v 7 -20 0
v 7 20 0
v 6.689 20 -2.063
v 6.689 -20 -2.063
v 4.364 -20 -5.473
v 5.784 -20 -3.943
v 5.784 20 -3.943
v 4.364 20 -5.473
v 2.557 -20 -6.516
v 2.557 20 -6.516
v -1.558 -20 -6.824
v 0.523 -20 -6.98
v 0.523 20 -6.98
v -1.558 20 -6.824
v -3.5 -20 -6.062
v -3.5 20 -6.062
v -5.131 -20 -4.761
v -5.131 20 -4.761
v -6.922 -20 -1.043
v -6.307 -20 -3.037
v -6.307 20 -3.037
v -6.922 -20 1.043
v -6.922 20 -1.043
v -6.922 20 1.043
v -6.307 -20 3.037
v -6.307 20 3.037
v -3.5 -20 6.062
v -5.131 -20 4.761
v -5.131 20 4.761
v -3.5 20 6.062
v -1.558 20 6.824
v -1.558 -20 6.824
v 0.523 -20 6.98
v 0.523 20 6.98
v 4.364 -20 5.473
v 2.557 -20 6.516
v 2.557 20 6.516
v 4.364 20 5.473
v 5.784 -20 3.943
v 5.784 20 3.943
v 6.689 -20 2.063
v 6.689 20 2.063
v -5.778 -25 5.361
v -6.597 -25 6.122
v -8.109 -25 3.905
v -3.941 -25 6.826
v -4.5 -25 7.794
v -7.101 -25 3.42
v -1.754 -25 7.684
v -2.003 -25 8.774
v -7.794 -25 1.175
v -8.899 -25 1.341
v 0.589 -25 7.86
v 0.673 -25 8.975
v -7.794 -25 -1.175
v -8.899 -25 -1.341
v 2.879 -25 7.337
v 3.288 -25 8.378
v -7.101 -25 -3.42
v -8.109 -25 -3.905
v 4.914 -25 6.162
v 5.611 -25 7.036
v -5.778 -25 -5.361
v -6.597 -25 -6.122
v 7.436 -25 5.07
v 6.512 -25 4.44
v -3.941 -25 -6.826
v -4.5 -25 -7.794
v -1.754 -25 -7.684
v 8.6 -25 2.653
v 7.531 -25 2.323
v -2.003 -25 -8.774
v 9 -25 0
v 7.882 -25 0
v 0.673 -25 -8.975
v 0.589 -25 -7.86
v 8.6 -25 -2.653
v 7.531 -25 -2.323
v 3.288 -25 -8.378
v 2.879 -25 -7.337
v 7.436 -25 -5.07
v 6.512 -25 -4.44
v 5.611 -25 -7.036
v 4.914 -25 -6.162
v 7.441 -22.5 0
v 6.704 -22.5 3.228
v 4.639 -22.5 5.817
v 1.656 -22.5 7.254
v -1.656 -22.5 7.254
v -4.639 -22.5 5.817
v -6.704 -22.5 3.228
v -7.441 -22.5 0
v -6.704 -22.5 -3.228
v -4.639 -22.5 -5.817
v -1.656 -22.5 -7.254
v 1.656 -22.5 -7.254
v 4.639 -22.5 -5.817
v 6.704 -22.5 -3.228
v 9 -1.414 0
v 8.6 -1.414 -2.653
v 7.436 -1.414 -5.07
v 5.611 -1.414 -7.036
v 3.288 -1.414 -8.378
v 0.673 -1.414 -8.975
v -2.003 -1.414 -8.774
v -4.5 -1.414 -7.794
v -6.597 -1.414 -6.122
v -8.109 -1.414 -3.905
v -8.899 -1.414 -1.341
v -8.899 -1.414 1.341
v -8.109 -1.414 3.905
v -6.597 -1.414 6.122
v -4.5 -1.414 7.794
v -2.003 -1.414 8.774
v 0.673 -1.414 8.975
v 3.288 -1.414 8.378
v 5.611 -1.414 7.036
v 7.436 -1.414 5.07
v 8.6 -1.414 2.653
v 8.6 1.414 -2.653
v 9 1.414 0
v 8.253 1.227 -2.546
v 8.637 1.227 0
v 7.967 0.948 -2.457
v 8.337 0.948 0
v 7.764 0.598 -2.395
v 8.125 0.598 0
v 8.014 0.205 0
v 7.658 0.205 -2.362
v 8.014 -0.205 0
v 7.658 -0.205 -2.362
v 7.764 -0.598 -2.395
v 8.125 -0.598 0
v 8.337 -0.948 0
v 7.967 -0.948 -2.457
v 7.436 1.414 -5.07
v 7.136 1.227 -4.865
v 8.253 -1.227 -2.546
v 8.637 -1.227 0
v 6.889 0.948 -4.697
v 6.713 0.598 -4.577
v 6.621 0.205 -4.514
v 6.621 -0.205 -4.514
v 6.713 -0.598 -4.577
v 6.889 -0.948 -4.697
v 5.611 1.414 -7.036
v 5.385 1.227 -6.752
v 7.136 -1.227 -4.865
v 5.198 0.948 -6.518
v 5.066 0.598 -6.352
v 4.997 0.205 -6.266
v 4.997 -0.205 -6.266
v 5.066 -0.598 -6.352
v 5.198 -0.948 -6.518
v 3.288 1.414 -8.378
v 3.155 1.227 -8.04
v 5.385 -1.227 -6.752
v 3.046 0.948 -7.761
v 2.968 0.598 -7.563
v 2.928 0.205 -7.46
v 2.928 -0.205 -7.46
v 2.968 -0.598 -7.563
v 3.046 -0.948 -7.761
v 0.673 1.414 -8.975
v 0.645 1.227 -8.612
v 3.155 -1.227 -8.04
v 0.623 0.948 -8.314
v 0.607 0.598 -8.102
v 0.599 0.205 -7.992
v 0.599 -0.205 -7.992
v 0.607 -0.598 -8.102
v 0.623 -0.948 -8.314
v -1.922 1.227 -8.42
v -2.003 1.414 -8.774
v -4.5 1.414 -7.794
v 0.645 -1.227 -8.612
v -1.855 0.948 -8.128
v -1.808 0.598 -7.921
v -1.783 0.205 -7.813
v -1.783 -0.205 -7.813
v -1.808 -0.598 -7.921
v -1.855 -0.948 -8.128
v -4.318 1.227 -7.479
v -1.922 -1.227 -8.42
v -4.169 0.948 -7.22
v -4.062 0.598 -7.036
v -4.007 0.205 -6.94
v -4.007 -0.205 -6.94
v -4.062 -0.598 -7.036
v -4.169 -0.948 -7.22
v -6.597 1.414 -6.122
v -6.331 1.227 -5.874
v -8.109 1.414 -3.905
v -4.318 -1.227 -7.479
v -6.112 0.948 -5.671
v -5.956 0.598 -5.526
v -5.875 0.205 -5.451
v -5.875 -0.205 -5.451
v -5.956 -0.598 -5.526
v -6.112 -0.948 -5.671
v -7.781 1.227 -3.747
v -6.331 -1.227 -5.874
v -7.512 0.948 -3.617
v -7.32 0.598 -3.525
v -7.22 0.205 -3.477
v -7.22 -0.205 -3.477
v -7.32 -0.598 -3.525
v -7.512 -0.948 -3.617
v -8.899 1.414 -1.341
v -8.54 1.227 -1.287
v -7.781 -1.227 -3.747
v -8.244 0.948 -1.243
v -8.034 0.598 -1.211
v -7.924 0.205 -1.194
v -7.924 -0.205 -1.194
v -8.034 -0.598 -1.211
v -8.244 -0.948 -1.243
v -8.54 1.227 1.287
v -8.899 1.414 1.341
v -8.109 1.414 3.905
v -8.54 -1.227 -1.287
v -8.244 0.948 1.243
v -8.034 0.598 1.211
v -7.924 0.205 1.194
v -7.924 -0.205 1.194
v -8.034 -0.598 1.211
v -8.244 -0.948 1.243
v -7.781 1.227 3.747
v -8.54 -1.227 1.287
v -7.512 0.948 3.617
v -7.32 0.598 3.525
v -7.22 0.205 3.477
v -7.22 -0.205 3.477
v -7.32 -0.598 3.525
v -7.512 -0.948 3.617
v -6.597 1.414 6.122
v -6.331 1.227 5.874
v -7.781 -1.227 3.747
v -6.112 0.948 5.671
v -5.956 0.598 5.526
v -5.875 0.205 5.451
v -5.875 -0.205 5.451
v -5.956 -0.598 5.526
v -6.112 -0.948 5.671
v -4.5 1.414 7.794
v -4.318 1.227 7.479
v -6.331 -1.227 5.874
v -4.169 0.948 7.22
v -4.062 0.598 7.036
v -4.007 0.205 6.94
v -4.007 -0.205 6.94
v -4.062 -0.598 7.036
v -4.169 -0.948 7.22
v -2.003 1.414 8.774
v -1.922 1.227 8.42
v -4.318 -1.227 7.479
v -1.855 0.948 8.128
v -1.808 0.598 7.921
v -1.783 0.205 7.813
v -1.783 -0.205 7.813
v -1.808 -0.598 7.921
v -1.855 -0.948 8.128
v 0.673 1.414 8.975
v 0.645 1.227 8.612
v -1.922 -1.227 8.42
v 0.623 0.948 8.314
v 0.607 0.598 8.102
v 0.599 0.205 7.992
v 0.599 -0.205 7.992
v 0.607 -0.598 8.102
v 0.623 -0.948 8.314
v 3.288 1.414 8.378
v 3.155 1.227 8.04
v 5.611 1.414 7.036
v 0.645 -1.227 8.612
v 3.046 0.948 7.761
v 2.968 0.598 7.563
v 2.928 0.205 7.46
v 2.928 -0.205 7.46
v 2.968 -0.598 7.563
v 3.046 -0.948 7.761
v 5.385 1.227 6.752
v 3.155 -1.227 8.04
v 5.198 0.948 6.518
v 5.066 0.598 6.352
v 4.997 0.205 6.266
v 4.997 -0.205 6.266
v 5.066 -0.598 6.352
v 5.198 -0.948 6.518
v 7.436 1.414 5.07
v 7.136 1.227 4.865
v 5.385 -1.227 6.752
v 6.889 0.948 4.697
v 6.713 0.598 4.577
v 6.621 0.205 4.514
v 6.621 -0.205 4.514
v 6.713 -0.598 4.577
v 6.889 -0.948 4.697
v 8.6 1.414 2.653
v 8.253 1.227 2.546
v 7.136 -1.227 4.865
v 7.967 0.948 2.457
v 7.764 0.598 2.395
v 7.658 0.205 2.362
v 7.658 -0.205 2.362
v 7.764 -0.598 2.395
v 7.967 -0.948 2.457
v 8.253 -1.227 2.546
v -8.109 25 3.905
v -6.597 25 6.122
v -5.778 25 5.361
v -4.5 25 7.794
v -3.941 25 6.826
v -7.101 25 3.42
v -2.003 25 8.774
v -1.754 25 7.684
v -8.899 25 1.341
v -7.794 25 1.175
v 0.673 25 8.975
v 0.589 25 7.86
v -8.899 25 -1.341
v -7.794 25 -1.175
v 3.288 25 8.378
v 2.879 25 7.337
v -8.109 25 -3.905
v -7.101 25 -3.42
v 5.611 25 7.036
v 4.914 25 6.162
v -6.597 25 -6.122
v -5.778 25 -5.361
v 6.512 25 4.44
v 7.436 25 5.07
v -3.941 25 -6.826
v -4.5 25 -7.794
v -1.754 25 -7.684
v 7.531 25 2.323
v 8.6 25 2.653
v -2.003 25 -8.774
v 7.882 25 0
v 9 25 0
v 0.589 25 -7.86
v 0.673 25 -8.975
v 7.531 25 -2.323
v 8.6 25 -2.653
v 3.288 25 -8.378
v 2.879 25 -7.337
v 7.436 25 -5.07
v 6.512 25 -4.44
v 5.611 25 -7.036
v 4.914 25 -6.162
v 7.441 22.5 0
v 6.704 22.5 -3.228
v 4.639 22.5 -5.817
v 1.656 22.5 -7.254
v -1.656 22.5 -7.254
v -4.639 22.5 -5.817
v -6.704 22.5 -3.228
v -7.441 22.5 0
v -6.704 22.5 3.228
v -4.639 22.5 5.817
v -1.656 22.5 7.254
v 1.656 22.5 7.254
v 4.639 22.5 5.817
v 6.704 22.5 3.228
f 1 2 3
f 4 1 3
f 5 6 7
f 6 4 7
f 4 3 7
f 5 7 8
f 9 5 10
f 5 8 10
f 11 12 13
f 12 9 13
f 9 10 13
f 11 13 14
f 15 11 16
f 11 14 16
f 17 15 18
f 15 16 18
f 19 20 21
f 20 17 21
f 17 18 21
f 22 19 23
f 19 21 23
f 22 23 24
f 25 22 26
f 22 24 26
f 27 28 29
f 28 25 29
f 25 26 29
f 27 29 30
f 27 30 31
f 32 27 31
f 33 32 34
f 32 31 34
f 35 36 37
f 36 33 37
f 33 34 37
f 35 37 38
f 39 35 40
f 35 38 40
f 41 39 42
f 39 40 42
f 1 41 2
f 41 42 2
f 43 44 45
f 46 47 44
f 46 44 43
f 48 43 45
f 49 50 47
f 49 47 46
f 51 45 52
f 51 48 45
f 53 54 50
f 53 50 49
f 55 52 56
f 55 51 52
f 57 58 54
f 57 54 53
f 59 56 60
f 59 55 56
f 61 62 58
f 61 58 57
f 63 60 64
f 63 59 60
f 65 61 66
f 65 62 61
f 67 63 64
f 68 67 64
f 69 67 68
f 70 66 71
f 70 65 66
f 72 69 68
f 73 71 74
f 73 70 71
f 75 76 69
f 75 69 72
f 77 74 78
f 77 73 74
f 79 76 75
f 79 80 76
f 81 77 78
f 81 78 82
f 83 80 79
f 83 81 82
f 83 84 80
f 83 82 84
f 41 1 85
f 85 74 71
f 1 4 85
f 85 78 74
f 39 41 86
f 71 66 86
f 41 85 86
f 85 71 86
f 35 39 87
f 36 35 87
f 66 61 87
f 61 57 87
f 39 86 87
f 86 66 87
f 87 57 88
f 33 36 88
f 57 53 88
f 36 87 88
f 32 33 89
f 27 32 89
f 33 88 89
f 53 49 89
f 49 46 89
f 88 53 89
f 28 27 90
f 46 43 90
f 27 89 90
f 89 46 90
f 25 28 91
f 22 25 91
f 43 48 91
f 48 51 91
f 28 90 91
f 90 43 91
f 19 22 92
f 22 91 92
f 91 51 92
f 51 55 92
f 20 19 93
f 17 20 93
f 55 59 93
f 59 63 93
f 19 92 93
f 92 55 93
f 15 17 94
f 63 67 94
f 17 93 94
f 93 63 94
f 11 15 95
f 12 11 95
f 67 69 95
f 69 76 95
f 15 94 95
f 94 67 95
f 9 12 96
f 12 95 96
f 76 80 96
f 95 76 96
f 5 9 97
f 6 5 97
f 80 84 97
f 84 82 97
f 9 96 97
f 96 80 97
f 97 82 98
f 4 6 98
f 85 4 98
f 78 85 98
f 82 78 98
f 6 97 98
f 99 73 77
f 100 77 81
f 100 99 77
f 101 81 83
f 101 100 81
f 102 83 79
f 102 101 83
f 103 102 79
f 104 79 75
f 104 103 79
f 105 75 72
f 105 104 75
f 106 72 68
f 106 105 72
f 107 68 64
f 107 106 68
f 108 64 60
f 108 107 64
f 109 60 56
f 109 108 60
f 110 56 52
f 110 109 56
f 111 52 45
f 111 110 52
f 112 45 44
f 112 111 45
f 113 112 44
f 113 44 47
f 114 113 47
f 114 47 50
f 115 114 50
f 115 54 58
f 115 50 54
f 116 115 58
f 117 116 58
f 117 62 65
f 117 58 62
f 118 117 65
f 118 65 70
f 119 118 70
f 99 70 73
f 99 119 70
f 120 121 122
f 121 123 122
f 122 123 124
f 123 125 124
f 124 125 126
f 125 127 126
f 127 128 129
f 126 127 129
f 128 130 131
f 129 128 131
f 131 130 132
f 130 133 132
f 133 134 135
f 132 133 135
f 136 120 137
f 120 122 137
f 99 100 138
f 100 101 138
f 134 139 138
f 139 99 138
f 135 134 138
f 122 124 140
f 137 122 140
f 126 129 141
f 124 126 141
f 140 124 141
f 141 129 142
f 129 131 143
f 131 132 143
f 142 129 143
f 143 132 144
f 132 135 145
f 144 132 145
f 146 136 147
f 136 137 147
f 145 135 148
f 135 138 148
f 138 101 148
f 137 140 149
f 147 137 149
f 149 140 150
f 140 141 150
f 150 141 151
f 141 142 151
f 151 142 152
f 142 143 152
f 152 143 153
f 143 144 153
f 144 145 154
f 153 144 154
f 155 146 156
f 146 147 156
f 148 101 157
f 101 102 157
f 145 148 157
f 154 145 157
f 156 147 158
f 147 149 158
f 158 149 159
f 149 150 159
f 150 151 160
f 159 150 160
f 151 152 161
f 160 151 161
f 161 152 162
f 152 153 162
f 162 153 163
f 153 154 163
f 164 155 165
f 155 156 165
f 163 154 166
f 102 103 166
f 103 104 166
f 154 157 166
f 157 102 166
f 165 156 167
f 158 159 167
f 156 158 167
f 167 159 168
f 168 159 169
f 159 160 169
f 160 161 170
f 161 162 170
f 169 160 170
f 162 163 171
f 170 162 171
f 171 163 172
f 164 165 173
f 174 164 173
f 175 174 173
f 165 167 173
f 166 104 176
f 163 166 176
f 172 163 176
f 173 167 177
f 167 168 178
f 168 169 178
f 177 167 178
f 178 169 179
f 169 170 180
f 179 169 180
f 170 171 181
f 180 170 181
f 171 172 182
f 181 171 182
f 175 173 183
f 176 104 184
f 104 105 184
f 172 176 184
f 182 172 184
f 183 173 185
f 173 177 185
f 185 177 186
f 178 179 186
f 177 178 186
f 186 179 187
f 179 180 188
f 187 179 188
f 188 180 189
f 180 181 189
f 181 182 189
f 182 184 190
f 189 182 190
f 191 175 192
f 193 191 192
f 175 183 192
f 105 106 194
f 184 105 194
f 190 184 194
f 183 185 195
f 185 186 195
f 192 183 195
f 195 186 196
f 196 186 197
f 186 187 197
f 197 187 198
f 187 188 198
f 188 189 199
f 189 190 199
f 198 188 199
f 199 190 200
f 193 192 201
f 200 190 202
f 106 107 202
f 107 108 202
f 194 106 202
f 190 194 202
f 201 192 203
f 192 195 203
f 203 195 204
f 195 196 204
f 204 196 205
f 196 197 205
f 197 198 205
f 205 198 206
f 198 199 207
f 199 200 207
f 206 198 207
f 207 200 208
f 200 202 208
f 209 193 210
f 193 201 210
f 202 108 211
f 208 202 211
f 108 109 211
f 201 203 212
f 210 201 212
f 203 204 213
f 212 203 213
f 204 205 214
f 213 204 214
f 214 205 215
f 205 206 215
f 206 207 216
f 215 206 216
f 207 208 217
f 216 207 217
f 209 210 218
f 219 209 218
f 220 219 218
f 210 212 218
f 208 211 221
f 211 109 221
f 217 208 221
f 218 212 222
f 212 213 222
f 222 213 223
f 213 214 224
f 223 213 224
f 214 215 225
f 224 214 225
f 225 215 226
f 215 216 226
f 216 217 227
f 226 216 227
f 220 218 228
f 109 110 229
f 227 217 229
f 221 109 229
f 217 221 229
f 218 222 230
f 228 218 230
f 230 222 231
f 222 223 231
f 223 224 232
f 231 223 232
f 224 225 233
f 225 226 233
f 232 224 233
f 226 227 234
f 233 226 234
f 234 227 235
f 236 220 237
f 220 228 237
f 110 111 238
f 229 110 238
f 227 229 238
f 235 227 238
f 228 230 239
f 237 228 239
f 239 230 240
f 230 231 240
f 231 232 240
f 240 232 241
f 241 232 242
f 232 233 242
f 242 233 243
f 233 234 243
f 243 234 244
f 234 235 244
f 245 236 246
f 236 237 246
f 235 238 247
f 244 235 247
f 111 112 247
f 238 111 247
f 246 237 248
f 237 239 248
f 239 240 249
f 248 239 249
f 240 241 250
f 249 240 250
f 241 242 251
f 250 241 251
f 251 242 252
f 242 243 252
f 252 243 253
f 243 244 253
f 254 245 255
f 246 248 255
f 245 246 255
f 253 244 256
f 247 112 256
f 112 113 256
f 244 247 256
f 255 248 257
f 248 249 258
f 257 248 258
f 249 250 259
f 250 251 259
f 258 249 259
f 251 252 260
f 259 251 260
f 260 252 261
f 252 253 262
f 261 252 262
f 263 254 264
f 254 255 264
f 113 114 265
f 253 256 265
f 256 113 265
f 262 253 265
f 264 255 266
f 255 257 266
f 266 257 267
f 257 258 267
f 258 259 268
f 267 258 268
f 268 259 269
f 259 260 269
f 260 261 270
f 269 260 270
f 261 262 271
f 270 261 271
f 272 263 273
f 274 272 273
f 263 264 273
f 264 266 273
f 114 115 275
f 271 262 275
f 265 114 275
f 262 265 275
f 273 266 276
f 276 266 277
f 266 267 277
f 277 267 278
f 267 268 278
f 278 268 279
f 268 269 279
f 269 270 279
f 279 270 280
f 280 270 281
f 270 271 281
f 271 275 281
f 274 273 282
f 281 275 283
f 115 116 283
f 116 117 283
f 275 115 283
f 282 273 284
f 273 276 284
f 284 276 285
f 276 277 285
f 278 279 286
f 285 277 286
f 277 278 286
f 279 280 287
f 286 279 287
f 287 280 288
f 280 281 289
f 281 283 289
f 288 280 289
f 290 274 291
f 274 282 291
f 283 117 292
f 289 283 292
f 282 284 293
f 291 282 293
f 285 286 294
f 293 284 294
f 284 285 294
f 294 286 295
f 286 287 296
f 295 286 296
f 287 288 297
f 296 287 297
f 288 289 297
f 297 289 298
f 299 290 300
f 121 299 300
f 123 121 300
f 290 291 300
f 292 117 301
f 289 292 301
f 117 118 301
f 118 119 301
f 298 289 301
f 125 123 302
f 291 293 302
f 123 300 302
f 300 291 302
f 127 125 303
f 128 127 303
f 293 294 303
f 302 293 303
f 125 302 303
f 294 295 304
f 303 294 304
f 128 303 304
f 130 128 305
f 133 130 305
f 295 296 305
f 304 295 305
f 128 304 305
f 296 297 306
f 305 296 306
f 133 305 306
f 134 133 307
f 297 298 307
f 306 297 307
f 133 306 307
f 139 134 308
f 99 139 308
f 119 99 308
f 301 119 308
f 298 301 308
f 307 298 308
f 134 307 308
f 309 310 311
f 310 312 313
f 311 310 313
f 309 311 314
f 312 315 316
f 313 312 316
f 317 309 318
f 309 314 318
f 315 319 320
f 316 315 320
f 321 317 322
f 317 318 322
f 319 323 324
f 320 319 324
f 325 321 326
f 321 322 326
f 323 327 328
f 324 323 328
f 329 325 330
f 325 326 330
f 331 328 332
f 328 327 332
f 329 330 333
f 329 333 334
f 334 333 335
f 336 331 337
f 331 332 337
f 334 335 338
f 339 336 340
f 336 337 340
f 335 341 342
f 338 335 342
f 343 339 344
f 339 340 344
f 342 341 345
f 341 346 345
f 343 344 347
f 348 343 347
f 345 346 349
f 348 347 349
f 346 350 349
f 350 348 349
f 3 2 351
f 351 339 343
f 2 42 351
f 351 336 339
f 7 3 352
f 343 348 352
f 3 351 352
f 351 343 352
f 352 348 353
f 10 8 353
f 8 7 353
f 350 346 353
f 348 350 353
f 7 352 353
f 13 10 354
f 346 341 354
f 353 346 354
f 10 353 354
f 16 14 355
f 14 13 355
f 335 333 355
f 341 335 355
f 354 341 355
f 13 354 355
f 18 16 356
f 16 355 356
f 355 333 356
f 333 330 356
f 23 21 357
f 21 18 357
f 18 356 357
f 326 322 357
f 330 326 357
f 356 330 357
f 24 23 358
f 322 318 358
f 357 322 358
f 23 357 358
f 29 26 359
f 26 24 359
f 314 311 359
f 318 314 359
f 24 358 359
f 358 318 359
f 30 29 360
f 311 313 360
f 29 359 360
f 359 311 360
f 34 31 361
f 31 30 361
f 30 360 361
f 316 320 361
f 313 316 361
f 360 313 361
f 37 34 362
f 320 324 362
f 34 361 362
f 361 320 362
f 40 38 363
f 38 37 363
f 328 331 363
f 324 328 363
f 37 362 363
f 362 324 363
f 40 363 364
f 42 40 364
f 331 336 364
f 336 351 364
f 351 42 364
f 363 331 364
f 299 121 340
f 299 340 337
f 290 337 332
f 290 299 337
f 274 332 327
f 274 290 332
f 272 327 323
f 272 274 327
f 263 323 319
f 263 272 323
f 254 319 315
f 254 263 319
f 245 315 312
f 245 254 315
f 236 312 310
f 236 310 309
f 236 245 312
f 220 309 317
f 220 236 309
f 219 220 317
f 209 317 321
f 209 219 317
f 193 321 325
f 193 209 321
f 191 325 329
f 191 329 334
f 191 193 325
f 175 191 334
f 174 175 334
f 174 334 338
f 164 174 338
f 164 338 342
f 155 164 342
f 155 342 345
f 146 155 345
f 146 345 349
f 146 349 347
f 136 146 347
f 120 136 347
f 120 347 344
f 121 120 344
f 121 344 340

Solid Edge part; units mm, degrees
sketch "Sketch1" plane through (0, 0, 0) normal (0, -1, 0) x (1, 0, 0)
  circle A0 centre (0, 0) radius 7
  circle A1 centre (0, 0) radius 9
extrude "Protrusion1" add sketch "Sketch1" along normal mid plane 50
sketch "Sketch2" plane through (0, 0, 0) normal (0, 0, 1) x (1, 0, 0)
  circle A0 centre (9.5, 0) radius 1.5
  dimension "D1" = 9.5
revolve "RevolvedCutout1" cut sketch "Sketch2" angle 360 about axis through (0, 54, 0) along (0, -1, 0)
chamfer "Chanfro_2" distance 5 angle 10 2 edges at (-7, -25, 0) (-7, 25, 0) measured on face at (3.8737, -16.1667, 5.8304)
